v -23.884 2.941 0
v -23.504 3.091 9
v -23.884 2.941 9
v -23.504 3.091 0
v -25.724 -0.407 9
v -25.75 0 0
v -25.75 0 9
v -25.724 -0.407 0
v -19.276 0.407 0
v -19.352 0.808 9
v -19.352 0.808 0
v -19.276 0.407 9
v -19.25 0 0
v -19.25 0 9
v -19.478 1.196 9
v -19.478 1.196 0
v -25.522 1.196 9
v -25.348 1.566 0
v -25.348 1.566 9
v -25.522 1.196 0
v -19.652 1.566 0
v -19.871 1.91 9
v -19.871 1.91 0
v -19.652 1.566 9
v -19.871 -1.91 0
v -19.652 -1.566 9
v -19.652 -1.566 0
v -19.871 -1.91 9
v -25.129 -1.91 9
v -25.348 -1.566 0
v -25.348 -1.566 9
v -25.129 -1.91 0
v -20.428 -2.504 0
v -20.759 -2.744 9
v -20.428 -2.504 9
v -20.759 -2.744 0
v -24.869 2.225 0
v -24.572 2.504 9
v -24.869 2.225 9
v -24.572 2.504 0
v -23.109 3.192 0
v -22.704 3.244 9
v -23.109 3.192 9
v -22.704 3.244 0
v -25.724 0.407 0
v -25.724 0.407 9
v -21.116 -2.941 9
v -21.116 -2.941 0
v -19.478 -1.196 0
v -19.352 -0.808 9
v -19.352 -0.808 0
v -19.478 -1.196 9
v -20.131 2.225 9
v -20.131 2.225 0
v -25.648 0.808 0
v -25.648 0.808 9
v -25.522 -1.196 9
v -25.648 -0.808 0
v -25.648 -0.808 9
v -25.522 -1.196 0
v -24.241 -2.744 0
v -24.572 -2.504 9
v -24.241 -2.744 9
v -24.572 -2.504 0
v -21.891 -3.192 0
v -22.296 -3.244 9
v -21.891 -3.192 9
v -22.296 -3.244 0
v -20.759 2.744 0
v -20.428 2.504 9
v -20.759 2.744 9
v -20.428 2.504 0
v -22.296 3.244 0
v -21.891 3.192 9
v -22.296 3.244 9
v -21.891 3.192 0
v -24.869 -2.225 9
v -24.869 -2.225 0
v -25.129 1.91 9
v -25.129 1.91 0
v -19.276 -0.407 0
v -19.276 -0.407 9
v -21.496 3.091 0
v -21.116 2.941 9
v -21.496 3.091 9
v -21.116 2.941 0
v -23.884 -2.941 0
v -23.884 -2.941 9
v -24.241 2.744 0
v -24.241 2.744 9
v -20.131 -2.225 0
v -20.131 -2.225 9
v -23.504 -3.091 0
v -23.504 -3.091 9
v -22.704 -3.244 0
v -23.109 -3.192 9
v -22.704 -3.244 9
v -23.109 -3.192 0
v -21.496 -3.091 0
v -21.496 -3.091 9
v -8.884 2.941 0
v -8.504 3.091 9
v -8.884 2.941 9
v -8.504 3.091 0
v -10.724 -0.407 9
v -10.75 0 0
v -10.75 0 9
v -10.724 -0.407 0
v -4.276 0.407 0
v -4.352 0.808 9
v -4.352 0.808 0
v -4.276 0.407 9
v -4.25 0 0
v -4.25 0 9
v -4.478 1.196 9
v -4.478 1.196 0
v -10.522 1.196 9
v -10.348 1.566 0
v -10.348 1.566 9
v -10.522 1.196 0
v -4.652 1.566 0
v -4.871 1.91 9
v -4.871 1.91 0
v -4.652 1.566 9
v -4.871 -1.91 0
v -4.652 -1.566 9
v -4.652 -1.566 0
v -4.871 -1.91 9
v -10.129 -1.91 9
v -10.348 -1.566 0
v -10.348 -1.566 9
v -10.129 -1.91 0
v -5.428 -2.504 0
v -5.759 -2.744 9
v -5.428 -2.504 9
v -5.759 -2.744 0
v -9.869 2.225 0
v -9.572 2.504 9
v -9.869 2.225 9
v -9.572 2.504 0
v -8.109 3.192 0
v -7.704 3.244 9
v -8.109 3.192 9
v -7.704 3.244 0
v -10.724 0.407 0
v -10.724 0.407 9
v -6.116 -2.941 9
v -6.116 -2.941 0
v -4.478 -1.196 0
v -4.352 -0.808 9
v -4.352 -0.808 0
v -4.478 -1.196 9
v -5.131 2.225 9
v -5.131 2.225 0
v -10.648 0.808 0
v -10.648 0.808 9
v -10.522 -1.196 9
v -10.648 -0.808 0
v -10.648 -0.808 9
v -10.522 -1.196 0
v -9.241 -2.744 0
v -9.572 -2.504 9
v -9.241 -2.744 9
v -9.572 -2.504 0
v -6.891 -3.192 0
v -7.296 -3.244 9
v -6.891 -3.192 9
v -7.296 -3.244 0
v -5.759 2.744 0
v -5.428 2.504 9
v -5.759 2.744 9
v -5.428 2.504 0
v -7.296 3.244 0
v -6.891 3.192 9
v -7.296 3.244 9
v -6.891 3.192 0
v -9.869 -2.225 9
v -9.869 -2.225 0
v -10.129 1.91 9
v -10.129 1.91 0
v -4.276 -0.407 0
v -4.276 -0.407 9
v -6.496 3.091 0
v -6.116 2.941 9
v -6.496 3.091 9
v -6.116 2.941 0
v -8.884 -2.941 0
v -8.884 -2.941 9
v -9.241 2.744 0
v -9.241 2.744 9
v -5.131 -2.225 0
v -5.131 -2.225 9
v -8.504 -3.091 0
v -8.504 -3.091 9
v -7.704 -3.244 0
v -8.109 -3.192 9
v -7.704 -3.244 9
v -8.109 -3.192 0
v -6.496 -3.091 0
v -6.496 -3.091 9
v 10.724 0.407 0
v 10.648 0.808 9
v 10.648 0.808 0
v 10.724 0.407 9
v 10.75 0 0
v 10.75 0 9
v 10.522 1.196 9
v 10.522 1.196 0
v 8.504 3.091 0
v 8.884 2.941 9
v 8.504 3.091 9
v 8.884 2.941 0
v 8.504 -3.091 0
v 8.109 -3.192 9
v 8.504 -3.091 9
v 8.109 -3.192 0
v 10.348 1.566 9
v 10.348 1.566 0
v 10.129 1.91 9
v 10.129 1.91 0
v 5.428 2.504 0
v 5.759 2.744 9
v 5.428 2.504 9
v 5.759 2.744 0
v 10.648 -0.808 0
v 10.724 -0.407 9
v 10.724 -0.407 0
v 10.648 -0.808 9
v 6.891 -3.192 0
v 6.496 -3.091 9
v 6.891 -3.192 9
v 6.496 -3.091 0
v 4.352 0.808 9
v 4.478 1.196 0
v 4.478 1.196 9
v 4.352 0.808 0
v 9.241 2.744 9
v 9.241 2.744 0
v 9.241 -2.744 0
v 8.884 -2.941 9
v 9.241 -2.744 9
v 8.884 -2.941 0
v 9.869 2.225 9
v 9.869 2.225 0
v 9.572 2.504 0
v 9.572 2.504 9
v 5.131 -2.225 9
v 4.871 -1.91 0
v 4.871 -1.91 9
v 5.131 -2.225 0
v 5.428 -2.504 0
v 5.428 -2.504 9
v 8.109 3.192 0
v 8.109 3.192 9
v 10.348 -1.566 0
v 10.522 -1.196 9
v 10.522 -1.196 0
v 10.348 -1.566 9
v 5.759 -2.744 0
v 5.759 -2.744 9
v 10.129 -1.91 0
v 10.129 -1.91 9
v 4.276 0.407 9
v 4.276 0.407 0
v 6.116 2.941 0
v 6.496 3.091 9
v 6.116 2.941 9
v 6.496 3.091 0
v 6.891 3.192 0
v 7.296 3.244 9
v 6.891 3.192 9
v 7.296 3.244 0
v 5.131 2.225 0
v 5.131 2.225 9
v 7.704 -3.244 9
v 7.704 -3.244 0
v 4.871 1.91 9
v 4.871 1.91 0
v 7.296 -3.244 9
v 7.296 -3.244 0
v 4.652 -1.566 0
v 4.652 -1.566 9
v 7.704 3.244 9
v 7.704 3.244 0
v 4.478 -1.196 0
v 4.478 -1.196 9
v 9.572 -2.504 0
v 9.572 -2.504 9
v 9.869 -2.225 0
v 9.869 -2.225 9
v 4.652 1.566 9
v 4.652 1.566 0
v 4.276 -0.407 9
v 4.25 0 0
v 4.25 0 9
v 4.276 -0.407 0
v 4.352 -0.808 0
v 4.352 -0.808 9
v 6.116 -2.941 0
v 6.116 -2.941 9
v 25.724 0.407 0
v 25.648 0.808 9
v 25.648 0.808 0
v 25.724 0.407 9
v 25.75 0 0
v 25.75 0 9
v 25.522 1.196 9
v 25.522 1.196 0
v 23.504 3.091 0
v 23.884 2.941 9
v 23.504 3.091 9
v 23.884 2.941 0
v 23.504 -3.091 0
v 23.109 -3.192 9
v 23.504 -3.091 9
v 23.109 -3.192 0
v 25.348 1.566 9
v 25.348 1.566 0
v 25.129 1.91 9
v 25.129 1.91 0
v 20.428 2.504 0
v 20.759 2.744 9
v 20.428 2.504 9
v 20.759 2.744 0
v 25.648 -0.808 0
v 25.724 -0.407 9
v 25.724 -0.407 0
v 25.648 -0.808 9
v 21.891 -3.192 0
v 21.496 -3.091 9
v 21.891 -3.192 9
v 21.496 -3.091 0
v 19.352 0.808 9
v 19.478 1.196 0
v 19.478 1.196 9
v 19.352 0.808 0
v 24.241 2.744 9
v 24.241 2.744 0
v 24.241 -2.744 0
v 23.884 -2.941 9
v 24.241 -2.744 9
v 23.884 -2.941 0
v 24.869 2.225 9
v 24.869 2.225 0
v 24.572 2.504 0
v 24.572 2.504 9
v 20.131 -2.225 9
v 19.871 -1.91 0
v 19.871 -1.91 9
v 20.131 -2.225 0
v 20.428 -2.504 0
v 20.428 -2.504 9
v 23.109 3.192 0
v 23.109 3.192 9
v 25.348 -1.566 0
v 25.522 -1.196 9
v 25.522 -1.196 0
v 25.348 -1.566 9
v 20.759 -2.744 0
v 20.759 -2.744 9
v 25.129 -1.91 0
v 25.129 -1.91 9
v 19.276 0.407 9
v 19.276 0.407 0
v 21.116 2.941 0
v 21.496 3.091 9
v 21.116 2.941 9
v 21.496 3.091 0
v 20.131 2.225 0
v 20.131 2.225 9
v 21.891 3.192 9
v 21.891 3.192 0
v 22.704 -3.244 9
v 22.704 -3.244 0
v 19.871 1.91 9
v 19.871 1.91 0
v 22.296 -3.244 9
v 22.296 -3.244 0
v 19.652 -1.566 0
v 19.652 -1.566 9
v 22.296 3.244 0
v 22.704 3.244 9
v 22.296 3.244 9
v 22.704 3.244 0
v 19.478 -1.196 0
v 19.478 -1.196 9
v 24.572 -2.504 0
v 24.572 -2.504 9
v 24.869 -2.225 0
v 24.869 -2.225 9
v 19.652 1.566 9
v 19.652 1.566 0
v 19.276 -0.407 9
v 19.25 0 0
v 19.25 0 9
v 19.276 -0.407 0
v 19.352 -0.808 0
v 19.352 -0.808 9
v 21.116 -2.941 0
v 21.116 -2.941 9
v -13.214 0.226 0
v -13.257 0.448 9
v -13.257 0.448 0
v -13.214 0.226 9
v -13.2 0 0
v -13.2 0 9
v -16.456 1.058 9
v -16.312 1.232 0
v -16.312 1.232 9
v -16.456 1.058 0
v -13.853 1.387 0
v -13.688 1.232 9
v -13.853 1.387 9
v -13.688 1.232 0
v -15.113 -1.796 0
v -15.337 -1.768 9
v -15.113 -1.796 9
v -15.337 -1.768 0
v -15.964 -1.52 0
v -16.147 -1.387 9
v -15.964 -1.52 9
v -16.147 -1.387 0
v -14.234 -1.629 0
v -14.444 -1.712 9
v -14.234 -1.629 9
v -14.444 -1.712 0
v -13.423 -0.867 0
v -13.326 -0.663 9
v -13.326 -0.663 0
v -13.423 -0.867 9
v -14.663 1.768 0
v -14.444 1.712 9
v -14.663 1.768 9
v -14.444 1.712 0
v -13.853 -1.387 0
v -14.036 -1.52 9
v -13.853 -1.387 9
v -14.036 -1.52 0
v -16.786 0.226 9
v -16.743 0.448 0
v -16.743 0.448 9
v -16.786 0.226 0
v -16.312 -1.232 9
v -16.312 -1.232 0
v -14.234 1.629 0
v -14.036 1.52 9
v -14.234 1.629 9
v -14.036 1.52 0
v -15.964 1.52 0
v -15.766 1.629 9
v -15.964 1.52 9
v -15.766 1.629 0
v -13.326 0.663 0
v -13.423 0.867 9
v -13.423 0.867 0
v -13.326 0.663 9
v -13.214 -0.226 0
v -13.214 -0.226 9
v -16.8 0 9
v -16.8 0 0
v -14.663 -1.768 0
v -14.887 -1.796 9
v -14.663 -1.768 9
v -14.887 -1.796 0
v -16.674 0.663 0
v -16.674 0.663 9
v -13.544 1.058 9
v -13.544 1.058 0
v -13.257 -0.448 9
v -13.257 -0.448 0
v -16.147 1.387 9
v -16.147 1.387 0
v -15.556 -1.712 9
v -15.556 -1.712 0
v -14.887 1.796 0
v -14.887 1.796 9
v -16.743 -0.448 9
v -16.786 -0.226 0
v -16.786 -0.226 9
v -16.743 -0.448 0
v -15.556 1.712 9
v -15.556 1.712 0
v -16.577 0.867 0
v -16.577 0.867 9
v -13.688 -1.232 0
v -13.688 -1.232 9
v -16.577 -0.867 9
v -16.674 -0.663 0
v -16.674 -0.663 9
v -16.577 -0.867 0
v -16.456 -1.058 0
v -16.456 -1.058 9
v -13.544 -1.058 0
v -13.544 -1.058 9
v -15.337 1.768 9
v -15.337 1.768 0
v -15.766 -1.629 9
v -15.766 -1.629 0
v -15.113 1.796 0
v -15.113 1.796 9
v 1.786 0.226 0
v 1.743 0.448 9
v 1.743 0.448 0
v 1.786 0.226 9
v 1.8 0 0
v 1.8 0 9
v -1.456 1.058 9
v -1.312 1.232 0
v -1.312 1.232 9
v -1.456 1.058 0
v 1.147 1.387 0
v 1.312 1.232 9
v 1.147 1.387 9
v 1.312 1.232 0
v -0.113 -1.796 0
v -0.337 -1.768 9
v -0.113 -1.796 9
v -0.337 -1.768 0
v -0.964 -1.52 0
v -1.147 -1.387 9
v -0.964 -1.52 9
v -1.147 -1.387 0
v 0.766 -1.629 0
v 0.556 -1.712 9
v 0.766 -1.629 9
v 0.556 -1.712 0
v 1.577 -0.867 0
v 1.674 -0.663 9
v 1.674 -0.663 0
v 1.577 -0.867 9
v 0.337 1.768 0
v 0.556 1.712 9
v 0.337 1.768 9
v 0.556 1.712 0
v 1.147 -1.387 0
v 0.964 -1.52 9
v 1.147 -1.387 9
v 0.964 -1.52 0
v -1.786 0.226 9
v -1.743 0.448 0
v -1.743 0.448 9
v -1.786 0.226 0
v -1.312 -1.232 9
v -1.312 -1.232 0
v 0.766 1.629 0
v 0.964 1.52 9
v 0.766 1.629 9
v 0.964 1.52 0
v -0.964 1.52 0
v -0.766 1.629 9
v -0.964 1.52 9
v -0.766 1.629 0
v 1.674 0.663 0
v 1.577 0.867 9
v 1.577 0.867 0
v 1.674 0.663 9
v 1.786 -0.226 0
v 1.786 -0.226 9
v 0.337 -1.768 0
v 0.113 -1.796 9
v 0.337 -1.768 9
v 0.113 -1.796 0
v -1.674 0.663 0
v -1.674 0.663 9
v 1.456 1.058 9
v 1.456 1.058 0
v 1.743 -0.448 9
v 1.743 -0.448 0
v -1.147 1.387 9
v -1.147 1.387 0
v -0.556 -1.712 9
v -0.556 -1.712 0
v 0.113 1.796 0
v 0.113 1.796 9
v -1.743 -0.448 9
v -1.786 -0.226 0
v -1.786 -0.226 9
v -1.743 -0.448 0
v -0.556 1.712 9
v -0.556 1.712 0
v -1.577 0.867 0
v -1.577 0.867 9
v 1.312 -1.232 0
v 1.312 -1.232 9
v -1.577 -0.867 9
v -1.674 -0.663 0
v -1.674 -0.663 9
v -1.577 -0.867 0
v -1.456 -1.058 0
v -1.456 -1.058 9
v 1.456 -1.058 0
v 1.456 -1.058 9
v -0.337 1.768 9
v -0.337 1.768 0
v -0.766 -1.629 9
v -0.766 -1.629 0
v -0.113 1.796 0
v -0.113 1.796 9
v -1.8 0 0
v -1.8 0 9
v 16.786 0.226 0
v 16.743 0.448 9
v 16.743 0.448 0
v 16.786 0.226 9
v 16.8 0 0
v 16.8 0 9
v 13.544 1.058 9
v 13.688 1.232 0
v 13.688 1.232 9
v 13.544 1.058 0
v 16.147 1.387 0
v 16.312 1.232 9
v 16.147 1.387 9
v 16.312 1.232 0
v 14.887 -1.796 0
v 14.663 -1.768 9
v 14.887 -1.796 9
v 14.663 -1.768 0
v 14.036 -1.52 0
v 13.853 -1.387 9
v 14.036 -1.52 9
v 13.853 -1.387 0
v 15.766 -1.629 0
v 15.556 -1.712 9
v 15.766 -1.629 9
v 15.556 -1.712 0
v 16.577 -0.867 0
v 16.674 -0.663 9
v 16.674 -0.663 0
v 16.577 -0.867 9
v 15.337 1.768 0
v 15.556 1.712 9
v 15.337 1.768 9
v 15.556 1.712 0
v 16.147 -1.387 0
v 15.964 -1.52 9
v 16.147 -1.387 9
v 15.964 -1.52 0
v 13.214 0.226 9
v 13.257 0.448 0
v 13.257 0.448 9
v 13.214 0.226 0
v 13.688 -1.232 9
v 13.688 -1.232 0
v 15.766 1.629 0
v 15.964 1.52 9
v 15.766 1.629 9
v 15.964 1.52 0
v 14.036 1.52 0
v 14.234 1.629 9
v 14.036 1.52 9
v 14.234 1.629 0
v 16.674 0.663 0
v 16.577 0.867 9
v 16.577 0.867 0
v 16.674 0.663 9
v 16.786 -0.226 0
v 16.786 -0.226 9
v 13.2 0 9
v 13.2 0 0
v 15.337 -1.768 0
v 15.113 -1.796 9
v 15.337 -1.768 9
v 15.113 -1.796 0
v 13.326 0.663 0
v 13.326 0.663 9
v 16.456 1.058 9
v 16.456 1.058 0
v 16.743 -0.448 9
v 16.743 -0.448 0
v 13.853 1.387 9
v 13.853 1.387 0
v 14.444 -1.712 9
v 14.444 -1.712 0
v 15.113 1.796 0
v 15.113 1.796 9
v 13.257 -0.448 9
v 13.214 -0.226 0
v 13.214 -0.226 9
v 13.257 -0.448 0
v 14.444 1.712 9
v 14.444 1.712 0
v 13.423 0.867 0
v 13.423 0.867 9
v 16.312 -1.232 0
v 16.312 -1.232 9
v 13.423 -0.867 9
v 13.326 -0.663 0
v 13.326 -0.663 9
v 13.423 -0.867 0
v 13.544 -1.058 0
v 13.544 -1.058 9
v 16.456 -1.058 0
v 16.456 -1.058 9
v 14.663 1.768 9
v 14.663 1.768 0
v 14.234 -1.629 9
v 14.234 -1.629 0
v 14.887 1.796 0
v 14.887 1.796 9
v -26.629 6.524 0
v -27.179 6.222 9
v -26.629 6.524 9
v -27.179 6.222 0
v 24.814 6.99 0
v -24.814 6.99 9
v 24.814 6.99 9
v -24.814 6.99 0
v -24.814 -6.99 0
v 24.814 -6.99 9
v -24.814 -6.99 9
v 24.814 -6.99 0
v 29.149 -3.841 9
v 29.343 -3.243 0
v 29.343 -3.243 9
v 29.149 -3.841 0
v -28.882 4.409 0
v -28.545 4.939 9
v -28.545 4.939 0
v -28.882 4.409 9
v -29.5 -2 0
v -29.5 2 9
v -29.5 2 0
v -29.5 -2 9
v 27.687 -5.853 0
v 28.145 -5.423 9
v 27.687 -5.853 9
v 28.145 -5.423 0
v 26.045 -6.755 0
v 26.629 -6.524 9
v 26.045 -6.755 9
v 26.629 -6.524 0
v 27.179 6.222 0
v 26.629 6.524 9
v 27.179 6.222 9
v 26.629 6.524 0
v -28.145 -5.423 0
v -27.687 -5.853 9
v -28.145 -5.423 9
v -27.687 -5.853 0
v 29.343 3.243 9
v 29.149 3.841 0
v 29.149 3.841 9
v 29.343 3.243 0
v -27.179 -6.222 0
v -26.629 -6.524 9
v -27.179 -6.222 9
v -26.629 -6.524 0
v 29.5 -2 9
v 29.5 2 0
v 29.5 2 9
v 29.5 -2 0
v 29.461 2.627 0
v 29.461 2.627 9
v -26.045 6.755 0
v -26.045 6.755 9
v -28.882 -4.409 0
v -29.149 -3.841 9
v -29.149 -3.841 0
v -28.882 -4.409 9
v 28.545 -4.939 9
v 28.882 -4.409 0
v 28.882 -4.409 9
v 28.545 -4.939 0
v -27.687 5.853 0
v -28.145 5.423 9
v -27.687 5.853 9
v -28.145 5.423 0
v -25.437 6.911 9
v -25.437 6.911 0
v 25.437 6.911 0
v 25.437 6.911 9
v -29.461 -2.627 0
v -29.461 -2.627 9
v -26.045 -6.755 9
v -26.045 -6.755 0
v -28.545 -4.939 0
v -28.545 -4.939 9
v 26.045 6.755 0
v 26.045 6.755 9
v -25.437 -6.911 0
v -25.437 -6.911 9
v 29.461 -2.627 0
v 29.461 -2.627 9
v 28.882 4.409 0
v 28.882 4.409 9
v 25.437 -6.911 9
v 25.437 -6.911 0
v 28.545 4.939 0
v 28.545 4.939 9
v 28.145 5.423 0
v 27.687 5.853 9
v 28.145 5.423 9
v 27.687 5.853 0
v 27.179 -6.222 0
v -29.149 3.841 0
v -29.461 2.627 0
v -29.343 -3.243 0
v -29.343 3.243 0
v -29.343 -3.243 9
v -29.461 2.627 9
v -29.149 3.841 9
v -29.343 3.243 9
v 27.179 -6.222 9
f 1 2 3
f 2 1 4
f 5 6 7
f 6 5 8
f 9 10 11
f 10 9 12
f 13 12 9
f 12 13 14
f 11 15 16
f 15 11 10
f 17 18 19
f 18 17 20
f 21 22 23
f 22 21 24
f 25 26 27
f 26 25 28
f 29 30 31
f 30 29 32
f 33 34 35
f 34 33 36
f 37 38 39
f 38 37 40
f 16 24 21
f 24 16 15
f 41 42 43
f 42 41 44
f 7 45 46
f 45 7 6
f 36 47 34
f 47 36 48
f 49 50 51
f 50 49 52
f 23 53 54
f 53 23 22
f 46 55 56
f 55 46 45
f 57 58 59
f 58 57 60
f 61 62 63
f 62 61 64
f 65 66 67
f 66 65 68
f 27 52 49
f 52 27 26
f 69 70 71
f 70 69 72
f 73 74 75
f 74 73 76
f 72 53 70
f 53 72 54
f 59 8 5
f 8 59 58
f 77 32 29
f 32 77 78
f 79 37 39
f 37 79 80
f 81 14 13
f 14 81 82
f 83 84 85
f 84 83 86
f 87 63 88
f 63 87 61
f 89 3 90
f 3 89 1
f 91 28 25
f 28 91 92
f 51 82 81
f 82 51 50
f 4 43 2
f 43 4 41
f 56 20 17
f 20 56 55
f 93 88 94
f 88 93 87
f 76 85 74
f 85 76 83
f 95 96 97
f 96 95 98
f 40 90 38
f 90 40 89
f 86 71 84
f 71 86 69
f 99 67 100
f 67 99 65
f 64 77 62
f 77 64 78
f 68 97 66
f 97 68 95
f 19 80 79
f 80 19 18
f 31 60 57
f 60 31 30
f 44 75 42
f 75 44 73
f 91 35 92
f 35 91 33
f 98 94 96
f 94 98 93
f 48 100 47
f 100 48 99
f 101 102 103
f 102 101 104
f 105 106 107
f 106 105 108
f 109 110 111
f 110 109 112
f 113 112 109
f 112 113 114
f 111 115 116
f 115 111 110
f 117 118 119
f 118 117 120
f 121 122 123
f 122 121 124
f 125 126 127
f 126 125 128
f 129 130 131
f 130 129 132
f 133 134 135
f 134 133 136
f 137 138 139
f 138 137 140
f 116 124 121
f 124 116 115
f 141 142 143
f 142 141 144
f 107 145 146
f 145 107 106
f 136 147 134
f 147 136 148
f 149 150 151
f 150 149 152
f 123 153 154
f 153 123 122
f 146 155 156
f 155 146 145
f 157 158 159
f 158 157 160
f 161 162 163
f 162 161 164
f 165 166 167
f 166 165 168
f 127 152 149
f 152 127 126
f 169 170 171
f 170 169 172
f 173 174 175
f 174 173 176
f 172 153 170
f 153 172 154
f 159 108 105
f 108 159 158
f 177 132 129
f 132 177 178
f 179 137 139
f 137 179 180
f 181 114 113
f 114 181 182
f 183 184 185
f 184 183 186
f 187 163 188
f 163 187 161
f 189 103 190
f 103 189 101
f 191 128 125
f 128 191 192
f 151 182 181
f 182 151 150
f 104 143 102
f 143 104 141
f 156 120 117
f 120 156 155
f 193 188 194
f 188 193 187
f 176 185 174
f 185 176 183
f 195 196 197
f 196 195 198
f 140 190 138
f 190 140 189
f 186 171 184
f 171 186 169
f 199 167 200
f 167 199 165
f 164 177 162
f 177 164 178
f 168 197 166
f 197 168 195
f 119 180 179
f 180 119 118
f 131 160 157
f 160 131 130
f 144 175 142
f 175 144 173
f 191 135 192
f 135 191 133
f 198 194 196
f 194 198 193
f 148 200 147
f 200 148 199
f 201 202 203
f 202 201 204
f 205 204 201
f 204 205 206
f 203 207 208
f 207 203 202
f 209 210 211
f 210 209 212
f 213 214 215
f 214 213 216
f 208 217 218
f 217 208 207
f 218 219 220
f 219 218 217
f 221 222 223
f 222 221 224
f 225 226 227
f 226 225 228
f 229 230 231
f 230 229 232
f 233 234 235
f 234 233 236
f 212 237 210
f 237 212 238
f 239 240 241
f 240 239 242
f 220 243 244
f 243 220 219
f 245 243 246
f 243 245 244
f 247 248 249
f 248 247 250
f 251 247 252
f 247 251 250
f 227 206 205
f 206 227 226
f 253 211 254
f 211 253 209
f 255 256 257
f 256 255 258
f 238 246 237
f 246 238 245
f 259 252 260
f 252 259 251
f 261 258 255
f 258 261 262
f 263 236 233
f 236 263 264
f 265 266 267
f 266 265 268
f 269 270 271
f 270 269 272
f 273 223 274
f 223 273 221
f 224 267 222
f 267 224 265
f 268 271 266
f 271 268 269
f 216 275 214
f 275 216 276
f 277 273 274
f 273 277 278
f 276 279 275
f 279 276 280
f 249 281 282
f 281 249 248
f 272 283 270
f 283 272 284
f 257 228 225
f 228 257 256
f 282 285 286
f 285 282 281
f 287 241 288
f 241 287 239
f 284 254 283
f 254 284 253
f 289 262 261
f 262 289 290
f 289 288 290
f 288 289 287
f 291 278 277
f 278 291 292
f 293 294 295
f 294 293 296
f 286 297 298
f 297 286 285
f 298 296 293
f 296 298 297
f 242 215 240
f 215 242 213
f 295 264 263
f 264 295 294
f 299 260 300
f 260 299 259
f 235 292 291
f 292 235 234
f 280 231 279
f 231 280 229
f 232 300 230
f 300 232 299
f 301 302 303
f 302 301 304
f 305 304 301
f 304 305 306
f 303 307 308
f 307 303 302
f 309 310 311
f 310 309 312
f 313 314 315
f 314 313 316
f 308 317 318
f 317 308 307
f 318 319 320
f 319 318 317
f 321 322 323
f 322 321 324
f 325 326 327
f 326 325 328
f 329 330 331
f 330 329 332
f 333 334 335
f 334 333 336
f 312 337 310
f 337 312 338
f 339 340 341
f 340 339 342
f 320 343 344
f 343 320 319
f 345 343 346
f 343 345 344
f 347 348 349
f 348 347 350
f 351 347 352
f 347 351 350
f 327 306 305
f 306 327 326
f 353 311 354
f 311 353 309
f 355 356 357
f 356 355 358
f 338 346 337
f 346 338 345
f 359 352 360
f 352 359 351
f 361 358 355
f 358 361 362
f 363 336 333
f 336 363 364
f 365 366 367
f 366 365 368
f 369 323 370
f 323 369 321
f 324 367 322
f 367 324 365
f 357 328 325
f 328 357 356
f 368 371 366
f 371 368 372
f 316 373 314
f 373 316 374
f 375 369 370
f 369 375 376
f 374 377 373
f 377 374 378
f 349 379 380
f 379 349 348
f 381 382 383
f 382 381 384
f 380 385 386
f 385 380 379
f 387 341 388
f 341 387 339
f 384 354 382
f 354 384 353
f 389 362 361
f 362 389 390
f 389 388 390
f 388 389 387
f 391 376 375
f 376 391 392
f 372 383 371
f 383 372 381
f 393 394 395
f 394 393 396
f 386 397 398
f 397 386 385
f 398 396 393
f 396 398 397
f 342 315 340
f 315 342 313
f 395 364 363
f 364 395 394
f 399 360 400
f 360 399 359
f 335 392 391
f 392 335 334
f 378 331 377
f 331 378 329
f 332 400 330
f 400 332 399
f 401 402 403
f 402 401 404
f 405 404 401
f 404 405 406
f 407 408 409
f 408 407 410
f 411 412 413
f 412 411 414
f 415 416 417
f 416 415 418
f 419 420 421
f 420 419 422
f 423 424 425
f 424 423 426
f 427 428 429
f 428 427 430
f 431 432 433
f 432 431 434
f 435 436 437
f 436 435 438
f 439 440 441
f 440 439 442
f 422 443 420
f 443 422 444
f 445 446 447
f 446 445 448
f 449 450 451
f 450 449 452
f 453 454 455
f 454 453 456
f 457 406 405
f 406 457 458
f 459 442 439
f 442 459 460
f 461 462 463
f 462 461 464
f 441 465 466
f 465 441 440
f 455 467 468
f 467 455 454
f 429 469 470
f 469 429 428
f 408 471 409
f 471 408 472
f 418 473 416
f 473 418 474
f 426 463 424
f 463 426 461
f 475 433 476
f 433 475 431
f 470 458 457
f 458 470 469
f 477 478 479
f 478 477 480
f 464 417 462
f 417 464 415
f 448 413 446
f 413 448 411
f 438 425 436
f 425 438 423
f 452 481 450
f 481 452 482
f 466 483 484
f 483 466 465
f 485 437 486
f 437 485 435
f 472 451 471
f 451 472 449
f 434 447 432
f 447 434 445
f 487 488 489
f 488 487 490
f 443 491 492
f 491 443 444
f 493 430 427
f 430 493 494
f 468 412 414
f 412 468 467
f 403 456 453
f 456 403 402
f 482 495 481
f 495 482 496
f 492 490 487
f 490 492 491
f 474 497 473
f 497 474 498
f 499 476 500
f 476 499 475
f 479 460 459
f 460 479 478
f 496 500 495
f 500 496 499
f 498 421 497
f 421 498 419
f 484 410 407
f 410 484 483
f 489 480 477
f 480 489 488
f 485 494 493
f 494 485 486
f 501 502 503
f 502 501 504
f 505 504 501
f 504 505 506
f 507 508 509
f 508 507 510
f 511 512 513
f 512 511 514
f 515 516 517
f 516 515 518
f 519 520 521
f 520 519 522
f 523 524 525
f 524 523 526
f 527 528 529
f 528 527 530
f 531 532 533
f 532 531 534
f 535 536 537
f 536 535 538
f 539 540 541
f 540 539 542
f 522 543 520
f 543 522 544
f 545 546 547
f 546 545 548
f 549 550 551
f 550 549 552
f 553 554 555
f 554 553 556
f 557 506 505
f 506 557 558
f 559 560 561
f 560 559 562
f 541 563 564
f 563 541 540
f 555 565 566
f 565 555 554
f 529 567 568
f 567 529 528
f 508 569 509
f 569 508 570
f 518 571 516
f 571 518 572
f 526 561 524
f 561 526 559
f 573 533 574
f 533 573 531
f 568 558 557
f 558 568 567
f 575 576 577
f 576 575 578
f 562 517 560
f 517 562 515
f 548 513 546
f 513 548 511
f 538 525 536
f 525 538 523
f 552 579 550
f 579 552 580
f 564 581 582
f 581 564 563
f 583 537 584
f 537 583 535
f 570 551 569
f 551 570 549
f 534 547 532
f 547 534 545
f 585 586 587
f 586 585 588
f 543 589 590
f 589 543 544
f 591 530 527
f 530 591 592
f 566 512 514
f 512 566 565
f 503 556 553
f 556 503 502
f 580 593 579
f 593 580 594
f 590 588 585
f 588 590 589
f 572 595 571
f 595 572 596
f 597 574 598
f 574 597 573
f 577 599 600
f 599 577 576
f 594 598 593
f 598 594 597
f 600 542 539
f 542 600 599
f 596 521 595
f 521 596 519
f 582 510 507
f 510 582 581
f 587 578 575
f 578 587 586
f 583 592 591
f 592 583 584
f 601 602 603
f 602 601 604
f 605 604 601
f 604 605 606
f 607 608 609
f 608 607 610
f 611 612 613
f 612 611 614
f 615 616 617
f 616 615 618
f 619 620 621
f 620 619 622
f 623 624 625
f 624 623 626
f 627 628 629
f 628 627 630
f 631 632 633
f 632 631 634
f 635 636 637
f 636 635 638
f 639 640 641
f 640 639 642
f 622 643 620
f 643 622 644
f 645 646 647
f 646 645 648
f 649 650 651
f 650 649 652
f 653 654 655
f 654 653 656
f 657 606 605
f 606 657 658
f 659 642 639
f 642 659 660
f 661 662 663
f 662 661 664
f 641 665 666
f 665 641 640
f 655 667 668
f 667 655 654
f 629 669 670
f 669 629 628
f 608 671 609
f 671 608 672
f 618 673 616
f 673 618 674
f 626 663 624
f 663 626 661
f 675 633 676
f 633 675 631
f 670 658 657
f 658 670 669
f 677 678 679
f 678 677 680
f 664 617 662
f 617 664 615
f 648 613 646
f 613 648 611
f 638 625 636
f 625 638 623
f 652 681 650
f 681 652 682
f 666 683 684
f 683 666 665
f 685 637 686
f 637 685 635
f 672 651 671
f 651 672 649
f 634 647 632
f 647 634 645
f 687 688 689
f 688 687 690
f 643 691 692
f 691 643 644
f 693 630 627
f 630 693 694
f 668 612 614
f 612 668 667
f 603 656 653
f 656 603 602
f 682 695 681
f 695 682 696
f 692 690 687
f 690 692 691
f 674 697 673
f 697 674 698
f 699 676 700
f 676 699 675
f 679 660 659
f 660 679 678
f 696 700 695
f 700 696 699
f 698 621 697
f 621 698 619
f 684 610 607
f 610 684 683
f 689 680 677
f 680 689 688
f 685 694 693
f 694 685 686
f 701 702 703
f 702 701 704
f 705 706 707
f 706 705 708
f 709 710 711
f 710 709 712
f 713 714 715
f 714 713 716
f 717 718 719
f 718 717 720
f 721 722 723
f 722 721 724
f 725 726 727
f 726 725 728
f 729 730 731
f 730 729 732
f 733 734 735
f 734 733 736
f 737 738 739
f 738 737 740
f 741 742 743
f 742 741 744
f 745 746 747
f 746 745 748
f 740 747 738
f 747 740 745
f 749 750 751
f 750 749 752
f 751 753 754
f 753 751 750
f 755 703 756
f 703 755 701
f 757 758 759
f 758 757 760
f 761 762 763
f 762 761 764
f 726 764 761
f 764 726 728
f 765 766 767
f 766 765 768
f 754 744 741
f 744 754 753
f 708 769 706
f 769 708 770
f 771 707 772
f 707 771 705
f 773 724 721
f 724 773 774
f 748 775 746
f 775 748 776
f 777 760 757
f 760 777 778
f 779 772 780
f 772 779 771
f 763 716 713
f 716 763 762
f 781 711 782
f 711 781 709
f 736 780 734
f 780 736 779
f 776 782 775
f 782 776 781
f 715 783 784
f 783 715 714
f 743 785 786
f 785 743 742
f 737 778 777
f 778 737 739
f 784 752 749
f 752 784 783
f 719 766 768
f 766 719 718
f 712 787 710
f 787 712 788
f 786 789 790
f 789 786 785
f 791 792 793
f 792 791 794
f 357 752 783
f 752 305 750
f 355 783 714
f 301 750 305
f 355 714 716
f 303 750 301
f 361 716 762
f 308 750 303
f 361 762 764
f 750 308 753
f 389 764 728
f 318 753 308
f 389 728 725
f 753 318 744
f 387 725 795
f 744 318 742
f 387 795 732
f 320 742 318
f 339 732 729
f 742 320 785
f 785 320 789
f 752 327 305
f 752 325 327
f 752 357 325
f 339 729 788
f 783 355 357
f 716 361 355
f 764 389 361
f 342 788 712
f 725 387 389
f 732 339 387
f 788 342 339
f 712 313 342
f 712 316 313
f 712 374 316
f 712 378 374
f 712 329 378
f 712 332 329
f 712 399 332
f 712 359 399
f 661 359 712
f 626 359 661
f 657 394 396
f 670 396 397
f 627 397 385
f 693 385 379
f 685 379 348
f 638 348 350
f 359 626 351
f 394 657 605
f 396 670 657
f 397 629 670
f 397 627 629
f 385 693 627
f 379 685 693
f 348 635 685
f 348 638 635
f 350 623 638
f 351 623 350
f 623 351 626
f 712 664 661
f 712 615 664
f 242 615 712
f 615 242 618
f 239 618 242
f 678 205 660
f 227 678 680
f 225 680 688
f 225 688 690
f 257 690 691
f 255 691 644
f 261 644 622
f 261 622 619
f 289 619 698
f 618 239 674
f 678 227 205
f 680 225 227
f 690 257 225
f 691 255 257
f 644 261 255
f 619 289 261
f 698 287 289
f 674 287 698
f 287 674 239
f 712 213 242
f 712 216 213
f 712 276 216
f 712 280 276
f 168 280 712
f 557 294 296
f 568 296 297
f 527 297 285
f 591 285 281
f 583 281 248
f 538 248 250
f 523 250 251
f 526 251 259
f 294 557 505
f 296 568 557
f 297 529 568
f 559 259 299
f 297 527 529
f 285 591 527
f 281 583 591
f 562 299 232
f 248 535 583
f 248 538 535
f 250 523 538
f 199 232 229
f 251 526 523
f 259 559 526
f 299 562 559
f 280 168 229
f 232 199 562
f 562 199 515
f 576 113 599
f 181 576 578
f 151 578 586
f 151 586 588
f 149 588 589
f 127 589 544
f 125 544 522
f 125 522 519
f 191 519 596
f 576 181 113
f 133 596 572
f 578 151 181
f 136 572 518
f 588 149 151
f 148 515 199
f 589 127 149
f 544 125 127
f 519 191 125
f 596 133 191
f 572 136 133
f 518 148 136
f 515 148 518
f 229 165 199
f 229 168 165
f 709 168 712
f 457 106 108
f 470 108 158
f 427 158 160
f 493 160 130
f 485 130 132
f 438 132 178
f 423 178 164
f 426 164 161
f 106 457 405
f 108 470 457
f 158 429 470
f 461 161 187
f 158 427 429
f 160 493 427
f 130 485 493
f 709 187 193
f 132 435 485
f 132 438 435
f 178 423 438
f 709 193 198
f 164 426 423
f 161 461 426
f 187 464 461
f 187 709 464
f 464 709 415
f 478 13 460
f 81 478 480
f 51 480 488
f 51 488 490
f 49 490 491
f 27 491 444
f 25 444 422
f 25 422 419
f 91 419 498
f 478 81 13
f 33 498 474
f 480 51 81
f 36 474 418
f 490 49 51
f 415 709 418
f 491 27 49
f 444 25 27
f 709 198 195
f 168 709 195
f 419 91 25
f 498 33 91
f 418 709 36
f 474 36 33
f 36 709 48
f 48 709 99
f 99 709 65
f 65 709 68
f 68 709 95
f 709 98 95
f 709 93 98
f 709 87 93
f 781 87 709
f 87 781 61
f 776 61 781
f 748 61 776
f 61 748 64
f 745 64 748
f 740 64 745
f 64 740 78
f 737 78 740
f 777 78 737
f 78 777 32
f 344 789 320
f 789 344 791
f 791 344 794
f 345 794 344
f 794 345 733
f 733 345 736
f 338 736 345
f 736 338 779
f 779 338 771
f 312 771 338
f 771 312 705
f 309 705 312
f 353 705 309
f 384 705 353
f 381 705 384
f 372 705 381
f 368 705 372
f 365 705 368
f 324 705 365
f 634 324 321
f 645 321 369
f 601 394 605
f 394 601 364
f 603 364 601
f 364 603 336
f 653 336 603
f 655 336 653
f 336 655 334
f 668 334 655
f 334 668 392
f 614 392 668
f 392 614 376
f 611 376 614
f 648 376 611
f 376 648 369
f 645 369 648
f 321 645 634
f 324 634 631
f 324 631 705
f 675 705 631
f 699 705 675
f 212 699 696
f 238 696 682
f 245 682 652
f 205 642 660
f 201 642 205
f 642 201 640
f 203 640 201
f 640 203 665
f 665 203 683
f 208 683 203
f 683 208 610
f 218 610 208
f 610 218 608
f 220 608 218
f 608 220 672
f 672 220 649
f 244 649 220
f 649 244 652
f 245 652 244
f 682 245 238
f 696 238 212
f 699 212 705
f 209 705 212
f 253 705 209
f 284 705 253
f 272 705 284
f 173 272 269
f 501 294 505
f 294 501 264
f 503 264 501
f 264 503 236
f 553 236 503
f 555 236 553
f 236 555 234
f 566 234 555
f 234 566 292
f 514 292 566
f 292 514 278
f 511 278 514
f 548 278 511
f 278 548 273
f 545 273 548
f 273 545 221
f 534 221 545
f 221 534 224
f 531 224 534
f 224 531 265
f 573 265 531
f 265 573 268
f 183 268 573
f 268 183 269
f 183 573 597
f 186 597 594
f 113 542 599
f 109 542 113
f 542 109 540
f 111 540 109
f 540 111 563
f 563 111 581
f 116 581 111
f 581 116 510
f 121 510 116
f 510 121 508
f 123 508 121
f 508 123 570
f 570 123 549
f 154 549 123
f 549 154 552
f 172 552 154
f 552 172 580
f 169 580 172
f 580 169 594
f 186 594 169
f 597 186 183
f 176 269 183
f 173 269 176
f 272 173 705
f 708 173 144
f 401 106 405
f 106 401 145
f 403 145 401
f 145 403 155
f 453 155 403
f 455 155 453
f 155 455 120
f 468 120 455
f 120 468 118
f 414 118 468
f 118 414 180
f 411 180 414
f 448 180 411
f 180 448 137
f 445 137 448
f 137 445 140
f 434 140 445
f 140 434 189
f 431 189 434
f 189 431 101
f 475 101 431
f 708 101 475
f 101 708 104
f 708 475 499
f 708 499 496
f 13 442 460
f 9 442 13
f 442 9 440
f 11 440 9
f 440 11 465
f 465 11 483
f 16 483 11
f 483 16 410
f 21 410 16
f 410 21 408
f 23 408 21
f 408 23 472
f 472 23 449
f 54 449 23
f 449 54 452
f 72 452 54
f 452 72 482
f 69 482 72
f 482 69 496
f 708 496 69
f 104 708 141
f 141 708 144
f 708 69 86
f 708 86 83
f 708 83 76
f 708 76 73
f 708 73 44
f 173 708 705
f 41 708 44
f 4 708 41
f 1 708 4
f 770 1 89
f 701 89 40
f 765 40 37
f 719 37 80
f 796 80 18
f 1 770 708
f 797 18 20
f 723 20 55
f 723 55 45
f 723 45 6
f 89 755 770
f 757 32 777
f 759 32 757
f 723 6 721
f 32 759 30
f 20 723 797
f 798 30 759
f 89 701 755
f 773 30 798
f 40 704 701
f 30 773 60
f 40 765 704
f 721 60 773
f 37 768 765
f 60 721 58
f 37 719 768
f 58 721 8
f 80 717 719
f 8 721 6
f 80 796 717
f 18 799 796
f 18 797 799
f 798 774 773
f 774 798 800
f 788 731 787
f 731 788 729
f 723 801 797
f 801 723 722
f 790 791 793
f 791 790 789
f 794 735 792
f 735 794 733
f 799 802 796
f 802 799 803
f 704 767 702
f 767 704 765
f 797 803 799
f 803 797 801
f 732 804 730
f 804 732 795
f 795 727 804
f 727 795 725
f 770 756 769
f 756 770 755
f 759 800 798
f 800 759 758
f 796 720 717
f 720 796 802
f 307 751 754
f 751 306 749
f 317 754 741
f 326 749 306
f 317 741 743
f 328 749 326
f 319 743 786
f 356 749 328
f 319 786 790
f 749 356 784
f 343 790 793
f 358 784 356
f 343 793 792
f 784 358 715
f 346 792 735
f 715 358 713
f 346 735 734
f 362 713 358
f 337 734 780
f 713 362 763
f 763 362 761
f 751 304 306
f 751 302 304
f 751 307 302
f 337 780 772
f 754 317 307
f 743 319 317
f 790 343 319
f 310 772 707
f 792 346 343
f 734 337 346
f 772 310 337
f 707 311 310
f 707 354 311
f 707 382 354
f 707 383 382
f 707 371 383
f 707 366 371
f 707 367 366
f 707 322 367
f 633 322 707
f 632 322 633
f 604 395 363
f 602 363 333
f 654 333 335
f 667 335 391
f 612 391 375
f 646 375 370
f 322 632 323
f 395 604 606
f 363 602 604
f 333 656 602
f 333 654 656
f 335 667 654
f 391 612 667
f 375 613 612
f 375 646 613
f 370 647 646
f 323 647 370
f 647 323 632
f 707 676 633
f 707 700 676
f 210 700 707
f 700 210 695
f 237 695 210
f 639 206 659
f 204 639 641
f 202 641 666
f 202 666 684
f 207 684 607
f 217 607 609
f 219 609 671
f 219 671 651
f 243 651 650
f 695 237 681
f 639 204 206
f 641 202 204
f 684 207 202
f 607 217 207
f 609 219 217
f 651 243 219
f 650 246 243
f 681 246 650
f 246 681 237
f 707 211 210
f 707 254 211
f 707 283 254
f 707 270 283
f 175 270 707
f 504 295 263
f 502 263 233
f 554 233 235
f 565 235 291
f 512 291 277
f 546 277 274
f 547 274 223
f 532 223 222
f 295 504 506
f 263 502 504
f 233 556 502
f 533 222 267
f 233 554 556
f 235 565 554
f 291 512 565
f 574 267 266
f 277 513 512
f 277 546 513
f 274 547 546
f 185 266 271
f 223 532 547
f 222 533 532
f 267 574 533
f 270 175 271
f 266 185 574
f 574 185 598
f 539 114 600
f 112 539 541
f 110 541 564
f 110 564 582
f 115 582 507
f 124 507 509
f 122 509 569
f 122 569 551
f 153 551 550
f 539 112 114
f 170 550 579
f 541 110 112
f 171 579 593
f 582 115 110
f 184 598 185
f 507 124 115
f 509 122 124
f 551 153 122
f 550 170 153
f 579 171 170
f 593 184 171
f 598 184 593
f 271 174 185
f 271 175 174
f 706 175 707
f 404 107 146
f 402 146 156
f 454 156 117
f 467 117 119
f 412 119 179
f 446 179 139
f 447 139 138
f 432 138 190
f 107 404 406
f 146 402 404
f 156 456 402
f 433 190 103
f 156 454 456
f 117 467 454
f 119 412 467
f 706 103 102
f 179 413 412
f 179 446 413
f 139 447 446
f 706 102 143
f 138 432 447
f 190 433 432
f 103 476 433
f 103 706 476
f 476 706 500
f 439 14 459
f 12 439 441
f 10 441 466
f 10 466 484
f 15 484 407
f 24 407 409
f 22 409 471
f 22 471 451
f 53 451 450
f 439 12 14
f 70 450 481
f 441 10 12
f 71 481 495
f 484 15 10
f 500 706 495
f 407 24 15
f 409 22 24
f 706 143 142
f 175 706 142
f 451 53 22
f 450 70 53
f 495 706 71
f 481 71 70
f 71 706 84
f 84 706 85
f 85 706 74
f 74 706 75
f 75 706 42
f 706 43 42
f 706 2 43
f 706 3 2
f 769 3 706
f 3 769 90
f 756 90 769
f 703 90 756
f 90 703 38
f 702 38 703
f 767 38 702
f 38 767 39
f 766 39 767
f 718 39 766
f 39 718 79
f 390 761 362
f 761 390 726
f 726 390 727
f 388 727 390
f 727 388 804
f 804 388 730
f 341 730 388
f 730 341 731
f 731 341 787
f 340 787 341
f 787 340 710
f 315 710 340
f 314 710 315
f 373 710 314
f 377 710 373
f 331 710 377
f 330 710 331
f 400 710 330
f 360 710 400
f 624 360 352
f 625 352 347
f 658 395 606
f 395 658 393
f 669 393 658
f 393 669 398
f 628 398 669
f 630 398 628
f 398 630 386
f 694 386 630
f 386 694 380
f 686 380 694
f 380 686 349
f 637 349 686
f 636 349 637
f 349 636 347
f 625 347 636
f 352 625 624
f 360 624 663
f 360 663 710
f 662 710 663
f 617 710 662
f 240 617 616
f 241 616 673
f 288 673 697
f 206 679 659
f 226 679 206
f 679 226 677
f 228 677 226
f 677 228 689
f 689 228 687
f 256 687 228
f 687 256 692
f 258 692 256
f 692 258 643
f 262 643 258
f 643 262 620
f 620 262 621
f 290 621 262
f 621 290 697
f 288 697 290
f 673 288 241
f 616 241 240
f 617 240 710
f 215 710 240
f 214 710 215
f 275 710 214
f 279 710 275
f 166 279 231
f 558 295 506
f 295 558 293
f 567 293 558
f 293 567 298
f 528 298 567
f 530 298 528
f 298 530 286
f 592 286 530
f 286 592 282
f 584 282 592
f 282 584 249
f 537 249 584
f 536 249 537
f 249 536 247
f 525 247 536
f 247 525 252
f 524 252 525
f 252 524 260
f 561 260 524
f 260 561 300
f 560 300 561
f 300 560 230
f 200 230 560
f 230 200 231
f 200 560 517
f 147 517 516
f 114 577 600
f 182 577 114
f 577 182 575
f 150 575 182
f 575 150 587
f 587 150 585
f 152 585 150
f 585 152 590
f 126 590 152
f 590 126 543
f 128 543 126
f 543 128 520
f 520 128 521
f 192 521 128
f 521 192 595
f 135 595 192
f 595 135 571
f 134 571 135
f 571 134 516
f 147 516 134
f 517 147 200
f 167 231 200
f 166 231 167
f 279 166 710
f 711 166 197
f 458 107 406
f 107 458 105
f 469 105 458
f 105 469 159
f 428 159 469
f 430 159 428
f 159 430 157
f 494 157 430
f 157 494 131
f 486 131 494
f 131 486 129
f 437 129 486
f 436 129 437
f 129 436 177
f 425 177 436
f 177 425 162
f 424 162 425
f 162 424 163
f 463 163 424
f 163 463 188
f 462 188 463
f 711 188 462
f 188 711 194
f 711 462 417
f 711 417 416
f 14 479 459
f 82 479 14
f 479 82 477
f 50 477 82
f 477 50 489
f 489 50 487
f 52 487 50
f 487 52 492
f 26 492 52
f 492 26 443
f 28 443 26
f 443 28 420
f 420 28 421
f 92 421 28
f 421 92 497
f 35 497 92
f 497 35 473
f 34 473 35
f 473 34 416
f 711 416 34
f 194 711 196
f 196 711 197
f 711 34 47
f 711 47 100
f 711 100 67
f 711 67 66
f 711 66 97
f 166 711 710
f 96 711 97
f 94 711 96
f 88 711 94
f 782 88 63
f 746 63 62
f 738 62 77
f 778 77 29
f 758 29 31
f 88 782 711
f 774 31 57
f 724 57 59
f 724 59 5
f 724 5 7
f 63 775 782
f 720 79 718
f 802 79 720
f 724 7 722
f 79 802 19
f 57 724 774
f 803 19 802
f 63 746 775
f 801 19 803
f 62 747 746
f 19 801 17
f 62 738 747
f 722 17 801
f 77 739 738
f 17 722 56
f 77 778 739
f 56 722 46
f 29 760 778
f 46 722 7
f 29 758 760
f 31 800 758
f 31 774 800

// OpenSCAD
$fn = 50;


difference() {
	union() {
		hull() {
			translate(v = [-24.5000000000, 2.0000000000, 0]) {
				cylinder(h = 9, r = 5);
			}
			translate(v = [24.5000000000, 2.0000000000, 0]) {
				cylinder(h = 9, r = 5);
			}
			translate(v = [-24.5000000000, -2.0000000000, 0]) {
				cylinder(h = 9, r = 5);
			}
			translate(v = [24.5000000000, -2.0000000000, 0]) {
				cylinder(h = 9, r = 5);
			}
		}
	}
	union() {
		translate(v = [-22.5000000000, 0.0000000000, 0]) {
			translate(v = [0, 0, -100]) {
				cylinder(h = 200, r = 3.2500000000);
			}
		}
		translate(v = [-7.5000000000, 0.0000000000, 0]) {
			translate(v = [0, 0, -100]) {
				cylinder(h = 200, r = 3.2500000000);
			}
		}
		translate(v = [7.5000000000, 0.0000000000, 0]) {
			translate(v = [0, 0, -100]) {
				cylinder(h = 200, r = 3.2500000000);
			}
		}
		translate(v = [22.5000000000, 0.0000000000, 0]) {
			translate(v = [0, 0, -100]) {
				cylinder(h = 200, r = 3.2500000000);
			}
		}
		translate(v = [-22.5000000000, 0.0000000000, 0]) {
			translate(v = [0, 0, -100]) {
				cylinder(h = 200, r = 1.8000000000);
			}
		}
		translate(v = [-15.0000000000, 0.0000000000, 0]) {
			translate(v = [0, 0, -100]) {
				cylinder(h = 200, r = 1.8000000000);
			}
		}
		translate(v = [-7.5000000000, 0.0000000000, 0]) {
			translate(v = [0, 0, -100]) {
				cylinder(h = 200, r = 1.8000000000);
			}
		}
		translate(v = [0, 0, -100]) {
			cylinder(h = 200, r = 1.8000000000);
		}
		translate(v = [7.5000000000, 0.0000000000, 0]) {
			translate(v = [0, 0, -100]) {
				cylinder(h = 200, r = 1.8000000000);
			}
		}
		translate(v = [15.0000000000, 0.0000000000, 0]) {
			translate(v = [0, 0, -100]) {
				cylinder(h = 200, r = 1.8000000000);
			}
		}
		translate(v = [22.5000000000, 0.0000000000, 0]) {
			translate(v = [0, 0, -100]) {
				cylinder(h = 200, r = 1.8000000000);
			}
		}
	}
}
